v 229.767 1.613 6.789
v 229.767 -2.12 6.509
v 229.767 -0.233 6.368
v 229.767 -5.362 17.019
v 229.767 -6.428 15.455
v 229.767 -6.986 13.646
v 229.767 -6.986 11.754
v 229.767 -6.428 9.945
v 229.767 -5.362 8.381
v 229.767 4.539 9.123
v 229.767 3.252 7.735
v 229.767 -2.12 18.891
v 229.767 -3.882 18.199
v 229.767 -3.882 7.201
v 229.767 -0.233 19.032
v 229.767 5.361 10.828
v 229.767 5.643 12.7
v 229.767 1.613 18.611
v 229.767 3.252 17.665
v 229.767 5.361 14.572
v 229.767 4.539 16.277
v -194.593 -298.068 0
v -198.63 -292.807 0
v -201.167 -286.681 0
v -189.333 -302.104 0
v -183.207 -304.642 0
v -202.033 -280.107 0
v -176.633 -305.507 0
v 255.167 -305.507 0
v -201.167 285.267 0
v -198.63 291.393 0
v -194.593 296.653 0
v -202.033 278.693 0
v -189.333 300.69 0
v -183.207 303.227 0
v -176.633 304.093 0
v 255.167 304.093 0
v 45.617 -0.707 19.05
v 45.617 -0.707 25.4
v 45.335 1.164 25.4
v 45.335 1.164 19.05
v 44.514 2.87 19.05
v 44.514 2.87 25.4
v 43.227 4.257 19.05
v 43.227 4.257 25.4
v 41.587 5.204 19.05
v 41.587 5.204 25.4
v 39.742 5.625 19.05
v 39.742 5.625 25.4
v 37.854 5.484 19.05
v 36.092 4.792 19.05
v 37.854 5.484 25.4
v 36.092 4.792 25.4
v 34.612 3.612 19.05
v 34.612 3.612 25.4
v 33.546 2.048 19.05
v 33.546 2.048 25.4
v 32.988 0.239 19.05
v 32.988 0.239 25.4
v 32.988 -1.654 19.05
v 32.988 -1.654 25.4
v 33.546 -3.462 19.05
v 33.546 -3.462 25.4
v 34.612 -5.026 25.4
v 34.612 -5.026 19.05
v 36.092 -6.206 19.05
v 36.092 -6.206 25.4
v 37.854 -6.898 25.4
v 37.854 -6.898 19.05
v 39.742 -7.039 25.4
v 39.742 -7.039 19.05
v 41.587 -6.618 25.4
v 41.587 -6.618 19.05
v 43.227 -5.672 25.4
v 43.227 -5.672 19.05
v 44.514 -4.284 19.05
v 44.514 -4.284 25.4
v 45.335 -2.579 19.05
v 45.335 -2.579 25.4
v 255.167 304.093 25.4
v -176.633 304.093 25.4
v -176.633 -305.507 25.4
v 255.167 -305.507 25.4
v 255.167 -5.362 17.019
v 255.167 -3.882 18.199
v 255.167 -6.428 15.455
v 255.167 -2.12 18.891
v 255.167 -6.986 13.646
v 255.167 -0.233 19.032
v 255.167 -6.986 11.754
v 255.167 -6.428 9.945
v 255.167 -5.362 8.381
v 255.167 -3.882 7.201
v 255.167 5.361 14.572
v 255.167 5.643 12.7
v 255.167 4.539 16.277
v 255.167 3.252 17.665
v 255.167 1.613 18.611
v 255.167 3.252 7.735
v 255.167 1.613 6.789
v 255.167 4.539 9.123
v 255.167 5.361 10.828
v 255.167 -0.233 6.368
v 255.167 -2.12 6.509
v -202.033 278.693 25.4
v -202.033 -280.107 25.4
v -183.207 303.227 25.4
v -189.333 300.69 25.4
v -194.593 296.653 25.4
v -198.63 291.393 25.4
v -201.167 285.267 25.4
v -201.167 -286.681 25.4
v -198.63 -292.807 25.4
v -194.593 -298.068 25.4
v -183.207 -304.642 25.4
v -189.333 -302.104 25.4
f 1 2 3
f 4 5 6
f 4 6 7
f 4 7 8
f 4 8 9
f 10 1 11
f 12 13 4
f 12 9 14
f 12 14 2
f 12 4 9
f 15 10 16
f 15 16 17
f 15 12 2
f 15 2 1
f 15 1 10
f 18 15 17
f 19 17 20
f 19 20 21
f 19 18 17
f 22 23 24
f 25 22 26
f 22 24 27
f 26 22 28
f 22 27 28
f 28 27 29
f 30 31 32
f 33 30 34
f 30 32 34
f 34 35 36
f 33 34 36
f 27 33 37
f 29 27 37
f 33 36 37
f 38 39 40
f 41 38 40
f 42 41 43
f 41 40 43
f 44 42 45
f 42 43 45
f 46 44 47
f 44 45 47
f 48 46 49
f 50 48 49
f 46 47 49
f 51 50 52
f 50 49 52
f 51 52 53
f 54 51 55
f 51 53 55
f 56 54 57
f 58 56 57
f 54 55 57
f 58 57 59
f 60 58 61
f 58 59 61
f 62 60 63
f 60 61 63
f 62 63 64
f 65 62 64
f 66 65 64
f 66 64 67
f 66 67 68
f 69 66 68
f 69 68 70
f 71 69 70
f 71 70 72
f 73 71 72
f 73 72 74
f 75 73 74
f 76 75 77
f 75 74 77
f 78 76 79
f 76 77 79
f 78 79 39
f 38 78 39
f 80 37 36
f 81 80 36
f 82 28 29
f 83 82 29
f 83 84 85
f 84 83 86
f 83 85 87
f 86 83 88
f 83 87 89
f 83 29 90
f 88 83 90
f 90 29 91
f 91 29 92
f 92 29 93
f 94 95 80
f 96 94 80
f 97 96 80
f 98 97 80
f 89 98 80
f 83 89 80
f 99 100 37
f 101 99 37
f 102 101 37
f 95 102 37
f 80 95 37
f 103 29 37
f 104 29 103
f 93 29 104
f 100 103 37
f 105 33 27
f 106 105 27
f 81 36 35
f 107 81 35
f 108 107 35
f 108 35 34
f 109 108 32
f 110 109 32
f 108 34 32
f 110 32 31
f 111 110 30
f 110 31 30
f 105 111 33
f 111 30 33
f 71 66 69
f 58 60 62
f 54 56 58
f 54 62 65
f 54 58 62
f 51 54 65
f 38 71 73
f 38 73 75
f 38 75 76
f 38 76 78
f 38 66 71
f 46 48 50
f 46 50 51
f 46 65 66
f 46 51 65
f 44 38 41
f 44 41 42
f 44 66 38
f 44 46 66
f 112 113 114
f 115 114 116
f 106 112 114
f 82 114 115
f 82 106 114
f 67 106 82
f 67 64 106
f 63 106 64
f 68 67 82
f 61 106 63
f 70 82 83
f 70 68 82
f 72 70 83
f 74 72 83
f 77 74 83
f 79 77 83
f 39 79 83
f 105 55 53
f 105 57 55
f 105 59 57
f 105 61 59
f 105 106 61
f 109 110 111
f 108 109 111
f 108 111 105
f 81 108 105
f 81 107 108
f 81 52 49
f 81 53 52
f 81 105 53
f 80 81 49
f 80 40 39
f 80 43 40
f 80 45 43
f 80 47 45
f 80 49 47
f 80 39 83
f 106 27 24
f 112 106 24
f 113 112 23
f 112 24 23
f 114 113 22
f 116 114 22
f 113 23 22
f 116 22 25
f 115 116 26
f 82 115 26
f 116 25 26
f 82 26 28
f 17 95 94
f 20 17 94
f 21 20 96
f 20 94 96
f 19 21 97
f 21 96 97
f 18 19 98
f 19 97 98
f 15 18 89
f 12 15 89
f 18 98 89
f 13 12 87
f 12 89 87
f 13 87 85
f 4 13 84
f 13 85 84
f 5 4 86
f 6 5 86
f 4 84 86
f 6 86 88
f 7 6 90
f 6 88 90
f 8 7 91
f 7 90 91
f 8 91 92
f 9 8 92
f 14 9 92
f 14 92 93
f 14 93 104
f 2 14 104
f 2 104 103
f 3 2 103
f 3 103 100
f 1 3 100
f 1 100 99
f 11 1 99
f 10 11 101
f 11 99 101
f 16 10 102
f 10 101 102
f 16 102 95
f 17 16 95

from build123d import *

# Parameters (mm, degrees)
F1_DEPTH = 25.4
F2_R     = 6.35
F3_DEPTH = 25.4
F4_R     = 6.35
F5_DEPTH = 6.35


with BuildPart() as f1:
    # F0 (on Top) → F1 (new body)
    with BuildSketch(Plane.XY):
        with BuildLine():
            Line((255.167366, -305.507209), (255.167366, 304.092791))
            Line((255.167366, 304.092791), (-176.632634, 304.092791))
            ThreePointArc((-176.632634, 304.092791), (-194.593147, 296.653303), (-202.032634, 278.692791))
            Line((-202.032634, 278.692791), (-202.032634, -280.107209))
            ThreePointArc((-202.032634, -280.107209), (-194.593147, -298.067721), (-176.632634, -305.507209))
            Line((-176.632634, -305.507209), (255.167366, -305.507209))
        make_face()
    extrude(amount=F1_DEPTH)

    # F2 (on face) → F3 (cut)
    with BuildSketch(Plane.YZ.offset(255.167366)):
        with Locations((-0.707209, 12.7)):
            Circle(F2_R)
    extrude(amount=-F3_DEPTH, mode=Mode.SUBTRACT)

    # F4 (on face) → F5 (cut)
    with BuildSketch(Plane.XY.offset(25.4)):
        with Locations((39.267366, -0.707209)):
            Circle(F4_R)
    extrude(amount=-F5_DEPTH, mode=Mode.SUBTRACT)


solid = f1.part
